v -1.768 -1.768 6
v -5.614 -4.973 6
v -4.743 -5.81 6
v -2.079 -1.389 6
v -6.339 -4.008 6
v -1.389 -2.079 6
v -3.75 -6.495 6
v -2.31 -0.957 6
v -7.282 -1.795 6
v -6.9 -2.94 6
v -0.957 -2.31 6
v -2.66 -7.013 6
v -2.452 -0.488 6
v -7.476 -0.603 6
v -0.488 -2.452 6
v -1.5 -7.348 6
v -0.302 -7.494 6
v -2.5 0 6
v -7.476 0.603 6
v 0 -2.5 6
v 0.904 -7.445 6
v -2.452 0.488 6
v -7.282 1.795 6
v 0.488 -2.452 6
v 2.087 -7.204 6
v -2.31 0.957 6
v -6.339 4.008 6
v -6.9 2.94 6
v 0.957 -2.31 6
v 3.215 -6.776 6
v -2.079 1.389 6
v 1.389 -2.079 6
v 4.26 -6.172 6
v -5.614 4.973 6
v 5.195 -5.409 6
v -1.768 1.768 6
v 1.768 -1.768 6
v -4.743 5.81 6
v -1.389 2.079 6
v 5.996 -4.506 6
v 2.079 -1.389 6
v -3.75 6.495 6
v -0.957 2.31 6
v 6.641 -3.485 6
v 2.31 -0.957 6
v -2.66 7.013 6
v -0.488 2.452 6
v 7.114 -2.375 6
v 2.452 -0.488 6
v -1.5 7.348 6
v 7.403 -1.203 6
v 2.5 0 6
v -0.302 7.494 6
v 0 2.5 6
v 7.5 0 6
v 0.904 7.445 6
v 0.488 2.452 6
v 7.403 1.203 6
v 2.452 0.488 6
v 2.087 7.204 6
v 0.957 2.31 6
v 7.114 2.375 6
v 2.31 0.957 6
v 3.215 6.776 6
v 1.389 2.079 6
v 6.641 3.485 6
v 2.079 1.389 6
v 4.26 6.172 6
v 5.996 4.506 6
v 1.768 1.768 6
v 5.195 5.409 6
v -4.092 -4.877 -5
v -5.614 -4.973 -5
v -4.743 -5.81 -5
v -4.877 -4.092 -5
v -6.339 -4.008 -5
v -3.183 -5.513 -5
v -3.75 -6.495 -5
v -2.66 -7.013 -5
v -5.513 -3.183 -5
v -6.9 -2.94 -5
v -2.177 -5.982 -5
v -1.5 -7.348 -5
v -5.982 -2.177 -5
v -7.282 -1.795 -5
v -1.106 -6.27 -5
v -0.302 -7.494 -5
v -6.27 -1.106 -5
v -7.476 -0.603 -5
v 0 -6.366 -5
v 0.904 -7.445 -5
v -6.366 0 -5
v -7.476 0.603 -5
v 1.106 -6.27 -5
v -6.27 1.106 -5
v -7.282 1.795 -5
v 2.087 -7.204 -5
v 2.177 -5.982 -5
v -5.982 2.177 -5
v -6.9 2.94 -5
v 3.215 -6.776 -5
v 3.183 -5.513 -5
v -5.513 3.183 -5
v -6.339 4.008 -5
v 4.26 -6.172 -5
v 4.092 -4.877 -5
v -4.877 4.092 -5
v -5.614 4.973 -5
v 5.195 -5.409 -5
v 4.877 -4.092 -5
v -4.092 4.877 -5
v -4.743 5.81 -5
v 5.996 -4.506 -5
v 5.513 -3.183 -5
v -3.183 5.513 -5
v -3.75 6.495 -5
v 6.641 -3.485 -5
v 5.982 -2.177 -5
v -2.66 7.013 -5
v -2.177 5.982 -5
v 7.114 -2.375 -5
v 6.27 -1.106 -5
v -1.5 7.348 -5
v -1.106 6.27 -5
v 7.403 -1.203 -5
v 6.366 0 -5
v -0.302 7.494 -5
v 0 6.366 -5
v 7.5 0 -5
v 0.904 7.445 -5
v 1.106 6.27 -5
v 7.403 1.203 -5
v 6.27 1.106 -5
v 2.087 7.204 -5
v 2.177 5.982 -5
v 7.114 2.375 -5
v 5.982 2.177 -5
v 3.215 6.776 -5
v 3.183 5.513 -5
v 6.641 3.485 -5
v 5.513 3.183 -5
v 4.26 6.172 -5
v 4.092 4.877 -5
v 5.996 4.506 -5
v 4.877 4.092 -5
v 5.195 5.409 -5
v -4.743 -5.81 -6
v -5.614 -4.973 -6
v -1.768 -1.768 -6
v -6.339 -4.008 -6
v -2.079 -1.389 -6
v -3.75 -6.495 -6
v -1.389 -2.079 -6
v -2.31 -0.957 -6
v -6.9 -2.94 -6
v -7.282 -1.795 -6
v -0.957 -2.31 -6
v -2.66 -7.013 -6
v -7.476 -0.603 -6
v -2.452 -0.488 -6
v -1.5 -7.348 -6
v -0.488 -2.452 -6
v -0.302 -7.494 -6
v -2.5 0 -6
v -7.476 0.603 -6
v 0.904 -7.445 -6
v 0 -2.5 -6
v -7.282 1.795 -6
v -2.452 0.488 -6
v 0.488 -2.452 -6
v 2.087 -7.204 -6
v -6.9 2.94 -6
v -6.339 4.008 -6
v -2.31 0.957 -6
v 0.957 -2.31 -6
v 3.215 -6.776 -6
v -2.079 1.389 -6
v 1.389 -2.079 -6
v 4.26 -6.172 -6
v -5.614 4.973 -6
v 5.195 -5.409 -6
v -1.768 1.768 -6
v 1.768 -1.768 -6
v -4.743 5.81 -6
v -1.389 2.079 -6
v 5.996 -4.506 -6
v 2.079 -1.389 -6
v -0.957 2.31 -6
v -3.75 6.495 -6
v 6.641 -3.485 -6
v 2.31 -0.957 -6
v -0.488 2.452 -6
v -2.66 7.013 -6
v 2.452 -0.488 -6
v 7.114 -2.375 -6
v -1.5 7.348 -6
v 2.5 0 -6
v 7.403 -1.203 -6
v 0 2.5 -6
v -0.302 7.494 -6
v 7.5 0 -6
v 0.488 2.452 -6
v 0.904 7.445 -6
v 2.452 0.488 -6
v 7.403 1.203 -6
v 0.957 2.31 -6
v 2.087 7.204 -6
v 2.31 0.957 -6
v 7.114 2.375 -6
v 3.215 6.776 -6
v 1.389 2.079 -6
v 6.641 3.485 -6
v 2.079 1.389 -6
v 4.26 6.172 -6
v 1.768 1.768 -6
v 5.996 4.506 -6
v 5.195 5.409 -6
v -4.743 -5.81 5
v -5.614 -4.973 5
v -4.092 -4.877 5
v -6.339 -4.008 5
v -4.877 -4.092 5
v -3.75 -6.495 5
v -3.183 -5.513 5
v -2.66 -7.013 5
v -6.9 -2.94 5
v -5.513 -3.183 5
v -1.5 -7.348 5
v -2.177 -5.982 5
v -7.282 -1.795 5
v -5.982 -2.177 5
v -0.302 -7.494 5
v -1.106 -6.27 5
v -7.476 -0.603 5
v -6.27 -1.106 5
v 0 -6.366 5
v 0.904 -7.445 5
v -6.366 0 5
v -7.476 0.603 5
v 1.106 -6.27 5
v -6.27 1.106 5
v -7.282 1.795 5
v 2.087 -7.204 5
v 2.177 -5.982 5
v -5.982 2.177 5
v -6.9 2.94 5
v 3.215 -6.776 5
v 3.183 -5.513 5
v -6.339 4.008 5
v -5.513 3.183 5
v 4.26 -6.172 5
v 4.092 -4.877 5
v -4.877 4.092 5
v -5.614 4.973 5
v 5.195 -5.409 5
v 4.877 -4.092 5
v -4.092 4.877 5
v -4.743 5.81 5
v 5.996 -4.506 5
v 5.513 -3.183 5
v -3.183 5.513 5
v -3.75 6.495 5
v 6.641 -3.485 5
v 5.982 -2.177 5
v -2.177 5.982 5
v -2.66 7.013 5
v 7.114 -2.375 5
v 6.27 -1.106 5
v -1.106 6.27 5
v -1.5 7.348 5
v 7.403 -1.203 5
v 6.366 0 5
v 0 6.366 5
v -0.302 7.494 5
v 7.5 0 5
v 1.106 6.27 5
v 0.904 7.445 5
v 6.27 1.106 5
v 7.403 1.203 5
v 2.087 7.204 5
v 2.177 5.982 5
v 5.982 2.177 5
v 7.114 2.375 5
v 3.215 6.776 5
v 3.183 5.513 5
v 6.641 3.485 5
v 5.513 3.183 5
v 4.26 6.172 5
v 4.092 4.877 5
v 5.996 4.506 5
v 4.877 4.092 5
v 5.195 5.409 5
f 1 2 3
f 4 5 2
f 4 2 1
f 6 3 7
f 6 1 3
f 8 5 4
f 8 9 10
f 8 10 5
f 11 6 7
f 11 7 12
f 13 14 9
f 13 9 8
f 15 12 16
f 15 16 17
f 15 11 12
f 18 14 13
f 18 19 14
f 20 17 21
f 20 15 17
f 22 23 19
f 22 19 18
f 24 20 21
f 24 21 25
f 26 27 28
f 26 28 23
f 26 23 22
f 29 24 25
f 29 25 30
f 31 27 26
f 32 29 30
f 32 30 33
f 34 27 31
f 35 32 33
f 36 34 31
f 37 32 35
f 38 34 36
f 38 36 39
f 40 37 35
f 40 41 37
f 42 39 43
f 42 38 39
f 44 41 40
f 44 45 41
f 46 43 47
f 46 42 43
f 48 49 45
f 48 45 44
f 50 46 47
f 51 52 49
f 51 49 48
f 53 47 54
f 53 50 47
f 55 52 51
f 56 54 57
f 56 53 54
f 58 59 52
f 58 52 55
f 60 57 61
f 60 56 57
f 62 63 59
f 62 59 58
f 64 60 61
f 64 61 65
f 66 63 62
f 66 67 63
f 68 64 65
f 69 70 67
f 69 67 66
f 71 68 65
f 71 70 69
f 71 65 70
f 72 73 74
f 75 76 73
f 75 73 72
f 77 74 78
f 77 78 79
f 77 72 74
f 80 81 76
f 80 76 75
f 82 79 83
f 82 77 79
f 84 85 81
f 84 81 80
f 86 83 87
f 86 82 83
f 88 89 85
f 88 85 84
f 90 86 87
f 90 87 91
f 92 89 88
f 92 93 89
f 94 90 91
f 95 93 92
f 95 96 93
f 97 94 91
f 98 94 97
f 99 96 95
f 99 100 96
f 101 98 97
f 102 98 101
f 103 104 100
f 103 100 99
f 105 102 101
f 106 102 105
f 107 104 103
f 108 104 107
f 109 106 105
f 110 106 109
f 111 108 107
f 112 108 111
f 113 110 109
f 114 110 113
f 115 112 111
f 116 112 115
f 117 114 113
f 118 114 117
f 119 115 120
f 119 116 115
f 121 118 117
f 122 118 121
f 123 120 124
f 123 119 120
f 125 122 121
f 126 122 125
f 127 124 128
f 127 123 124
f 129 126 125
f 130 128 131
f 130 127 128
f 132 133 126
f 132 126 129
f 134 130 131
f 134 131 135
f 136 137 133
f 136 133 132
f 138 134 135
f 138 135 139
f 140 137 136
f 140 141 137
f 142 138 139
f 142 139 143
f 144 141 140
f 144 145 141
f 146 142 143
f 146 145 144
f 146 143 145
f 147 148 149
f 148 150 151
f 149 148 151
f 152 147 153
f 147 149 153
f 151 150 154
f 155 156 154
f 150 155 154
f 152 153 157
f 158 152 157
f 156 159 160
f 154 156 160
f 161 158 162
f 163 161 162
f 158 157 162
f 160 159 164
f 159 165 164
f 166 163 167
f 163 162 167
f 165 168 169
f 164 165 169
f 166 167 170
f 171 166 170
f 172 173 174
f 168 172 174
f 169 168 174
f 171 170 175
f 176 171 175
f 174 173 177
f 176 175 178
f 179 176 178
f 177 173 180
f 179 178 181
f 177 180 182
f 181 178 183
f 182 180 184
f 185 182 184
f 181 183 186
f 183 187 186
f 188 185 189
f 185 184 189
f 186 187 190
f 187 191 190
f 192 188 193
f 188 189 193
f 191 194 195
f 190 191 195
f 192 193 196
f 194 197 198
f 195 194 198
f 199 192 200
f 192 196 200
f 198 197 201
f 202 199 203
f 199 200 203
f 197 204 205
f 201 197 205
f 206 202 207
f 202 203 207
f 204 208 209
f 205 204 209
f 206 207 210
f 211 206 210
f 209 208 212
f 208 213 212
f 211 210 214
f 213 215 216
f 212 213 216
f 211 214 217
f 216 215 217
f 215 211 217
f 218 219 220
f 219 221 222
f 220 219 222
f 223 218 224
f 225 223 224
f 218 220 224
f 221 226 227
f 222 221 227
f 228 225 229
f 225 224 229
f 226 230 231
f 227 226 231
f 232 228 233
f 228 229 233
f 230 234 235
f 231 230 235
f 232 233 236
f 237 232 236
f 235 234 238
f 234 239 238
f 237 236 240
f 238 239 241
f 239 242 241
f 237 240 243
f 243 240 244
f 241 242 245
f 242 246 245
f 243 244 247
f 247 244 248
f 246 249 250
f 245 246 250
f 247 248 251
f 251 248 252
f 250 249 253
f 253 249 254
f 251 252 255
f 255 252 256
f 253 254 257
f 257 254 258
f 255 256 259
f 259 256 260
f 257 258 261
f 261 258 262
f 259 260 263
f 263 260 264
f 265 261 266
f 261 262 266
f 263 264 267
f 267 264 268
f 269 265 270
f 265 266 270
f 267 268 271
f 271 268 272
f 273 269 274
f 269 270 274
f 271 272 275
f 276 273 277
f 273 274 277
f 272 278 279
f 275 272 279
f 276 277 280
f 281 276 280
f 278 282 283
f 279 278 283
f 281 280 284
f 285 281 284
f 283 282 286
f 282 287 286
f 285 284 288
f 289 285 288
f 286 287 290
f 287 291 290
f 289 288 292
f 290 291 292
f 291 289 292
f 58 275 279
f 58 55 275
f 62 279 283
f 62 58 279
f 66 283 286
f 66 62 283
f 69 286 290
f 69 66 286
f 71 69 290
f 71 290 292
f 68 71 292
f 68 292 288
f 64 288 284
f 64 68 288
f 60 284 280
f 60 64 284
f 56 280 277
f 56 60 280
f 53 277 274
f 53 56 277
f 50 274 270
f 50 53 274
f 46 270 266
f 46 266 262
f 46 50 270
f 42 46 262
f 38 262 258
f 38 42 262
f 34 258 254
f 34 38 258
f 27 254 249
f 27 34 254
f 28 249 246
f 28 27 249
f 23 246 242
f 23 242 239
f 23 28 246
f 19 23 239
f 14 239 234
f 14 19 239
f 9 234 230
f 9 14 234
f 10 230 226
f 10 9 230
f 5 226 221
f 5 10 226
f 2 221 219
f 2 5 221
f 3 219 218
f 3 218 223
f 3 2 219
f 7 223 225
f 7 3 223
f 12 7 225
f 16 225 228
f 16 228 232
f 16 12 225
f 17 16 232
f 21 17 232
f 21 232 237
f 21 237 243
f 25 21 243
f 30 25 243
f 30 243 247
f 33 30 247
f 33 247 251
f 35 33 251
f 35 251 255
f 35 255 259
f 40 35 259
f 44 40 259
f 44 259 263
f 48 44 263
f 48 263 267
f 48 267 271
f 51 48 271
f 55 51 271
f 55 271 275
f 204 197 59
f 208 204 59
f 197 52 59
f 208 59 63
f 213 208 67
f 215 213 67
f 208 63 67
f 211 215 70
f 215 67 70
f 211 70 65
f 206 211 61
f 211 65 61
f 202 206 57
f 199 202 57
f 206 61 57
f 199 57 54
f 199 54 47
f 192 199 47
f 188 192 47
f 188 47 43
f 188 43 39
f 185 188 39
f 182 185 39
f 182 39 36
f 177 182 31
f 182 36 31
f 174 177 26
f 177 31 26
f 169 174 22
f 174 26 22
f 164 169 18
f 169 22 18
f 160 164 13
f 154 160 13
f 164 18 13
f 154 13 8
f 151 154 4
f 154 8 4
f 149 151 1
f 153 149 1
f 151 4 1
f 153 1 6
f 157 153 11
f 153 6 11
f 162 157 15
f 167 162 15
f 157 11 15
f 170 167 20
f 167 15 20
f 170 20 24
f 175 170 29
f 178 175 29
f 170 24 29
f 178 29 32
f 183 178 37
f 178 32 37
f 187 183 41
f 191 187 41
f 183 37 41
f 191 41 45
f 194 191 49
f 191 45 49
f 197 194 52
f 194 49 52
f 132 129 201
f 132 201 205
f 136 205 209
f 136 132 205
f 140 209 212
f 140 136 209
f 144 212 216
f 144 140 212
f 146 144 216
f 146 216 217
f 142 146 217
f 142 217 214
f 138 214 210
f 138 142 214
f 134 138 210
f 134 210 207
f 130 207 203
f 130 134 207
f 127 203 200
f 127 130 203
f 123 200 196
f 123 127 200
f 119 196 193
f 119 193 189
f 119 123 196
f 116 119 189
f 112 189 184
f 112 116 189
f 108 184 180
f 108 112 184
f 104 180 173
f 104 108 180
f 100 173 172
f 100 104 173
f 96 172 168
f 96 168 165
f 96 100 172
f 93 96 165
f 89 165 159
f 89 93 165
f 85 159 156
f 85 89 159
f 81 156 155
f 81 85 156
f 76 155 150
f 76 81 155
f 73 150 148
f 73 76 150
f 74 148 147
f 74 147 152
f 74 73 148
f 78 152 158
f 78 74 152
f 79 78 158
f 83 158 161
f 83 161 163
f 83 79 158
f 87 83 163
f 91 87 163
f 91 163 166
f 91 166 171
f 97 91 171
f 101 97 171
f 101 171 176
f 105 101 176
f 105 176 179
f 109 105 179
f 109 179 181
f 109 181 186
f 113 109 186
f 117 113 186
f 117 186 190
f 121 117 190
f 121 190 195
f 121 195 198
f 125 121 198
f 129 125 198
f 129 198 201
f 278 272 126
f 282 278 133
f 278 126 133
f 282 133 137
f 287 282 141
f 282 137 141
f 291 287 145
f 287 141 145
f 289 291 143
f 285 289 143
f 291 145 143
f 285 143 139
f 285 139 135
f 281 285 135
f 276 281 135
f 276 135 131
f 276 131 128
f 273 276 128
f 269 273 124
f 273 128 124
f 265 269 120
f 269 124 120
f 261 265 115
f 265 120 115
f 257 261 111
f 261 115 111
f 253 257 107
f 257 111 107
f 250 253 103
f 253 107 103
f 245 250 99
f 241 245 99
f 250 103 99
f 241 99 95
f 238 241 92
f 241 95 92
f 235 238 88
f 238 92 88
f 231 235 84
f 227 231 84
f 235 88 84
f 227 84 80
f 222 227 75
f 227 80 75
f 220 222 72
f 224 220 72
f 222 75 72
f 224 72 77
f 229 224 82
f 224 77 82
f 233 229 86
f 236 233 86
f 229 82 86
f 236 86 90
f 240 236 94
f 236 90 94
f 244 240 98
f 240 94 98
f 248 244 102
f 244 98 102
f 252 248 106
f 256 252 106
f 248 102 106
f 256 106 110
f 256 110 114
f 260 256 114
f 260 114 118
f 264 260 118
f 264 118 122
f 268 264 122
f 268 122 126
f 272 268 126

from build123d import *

# Parameters (mm, degrees)
SKETCH1_R           = 7.5
BOSS_EXTRUDE1_DEPTH = 6
SKETCH2_R           = 7.5
SKETCH2_R_2         = 6.366385485
CUT_EXTRUDE1_DEPTH  = 5
SKETCH3_R           = 2.5
CUT_EXTRUDE2_DEPTH  = 6


with BuildPart() as part:
    # Sketch1 → Boss-Extrude1 (new, symmetric)
    with BuildSketch(Plane.XY):
        Circle(SKETCH1_R)
    extrude(amount=BOSS_EXTRUDE1_DEPTH, both=True)

    # Sketch2 → Cut-Extrude1 (cut, symmetric)
    with BuildSketch(Plane.XY):
        Circle(SKETCH2_R)
        Circle(SKETCH2_R_2, mode=Mode.SUBTRACT)
    extrude(amount=CUT_EXTRUDE1_DEPTH, both=True, mode=Mode.SUBTRACT)

    # Sketch3 → Cut-Extrude2 (cut, symmetric)
    with BuildSketch(Plane.XY):
        Circle(SKETCH3_R)
    extrude(amount=CUT_EXTRUDE2_DEPTH, both=True, mode=Mode.SUBTRACT)


solid = part.part
